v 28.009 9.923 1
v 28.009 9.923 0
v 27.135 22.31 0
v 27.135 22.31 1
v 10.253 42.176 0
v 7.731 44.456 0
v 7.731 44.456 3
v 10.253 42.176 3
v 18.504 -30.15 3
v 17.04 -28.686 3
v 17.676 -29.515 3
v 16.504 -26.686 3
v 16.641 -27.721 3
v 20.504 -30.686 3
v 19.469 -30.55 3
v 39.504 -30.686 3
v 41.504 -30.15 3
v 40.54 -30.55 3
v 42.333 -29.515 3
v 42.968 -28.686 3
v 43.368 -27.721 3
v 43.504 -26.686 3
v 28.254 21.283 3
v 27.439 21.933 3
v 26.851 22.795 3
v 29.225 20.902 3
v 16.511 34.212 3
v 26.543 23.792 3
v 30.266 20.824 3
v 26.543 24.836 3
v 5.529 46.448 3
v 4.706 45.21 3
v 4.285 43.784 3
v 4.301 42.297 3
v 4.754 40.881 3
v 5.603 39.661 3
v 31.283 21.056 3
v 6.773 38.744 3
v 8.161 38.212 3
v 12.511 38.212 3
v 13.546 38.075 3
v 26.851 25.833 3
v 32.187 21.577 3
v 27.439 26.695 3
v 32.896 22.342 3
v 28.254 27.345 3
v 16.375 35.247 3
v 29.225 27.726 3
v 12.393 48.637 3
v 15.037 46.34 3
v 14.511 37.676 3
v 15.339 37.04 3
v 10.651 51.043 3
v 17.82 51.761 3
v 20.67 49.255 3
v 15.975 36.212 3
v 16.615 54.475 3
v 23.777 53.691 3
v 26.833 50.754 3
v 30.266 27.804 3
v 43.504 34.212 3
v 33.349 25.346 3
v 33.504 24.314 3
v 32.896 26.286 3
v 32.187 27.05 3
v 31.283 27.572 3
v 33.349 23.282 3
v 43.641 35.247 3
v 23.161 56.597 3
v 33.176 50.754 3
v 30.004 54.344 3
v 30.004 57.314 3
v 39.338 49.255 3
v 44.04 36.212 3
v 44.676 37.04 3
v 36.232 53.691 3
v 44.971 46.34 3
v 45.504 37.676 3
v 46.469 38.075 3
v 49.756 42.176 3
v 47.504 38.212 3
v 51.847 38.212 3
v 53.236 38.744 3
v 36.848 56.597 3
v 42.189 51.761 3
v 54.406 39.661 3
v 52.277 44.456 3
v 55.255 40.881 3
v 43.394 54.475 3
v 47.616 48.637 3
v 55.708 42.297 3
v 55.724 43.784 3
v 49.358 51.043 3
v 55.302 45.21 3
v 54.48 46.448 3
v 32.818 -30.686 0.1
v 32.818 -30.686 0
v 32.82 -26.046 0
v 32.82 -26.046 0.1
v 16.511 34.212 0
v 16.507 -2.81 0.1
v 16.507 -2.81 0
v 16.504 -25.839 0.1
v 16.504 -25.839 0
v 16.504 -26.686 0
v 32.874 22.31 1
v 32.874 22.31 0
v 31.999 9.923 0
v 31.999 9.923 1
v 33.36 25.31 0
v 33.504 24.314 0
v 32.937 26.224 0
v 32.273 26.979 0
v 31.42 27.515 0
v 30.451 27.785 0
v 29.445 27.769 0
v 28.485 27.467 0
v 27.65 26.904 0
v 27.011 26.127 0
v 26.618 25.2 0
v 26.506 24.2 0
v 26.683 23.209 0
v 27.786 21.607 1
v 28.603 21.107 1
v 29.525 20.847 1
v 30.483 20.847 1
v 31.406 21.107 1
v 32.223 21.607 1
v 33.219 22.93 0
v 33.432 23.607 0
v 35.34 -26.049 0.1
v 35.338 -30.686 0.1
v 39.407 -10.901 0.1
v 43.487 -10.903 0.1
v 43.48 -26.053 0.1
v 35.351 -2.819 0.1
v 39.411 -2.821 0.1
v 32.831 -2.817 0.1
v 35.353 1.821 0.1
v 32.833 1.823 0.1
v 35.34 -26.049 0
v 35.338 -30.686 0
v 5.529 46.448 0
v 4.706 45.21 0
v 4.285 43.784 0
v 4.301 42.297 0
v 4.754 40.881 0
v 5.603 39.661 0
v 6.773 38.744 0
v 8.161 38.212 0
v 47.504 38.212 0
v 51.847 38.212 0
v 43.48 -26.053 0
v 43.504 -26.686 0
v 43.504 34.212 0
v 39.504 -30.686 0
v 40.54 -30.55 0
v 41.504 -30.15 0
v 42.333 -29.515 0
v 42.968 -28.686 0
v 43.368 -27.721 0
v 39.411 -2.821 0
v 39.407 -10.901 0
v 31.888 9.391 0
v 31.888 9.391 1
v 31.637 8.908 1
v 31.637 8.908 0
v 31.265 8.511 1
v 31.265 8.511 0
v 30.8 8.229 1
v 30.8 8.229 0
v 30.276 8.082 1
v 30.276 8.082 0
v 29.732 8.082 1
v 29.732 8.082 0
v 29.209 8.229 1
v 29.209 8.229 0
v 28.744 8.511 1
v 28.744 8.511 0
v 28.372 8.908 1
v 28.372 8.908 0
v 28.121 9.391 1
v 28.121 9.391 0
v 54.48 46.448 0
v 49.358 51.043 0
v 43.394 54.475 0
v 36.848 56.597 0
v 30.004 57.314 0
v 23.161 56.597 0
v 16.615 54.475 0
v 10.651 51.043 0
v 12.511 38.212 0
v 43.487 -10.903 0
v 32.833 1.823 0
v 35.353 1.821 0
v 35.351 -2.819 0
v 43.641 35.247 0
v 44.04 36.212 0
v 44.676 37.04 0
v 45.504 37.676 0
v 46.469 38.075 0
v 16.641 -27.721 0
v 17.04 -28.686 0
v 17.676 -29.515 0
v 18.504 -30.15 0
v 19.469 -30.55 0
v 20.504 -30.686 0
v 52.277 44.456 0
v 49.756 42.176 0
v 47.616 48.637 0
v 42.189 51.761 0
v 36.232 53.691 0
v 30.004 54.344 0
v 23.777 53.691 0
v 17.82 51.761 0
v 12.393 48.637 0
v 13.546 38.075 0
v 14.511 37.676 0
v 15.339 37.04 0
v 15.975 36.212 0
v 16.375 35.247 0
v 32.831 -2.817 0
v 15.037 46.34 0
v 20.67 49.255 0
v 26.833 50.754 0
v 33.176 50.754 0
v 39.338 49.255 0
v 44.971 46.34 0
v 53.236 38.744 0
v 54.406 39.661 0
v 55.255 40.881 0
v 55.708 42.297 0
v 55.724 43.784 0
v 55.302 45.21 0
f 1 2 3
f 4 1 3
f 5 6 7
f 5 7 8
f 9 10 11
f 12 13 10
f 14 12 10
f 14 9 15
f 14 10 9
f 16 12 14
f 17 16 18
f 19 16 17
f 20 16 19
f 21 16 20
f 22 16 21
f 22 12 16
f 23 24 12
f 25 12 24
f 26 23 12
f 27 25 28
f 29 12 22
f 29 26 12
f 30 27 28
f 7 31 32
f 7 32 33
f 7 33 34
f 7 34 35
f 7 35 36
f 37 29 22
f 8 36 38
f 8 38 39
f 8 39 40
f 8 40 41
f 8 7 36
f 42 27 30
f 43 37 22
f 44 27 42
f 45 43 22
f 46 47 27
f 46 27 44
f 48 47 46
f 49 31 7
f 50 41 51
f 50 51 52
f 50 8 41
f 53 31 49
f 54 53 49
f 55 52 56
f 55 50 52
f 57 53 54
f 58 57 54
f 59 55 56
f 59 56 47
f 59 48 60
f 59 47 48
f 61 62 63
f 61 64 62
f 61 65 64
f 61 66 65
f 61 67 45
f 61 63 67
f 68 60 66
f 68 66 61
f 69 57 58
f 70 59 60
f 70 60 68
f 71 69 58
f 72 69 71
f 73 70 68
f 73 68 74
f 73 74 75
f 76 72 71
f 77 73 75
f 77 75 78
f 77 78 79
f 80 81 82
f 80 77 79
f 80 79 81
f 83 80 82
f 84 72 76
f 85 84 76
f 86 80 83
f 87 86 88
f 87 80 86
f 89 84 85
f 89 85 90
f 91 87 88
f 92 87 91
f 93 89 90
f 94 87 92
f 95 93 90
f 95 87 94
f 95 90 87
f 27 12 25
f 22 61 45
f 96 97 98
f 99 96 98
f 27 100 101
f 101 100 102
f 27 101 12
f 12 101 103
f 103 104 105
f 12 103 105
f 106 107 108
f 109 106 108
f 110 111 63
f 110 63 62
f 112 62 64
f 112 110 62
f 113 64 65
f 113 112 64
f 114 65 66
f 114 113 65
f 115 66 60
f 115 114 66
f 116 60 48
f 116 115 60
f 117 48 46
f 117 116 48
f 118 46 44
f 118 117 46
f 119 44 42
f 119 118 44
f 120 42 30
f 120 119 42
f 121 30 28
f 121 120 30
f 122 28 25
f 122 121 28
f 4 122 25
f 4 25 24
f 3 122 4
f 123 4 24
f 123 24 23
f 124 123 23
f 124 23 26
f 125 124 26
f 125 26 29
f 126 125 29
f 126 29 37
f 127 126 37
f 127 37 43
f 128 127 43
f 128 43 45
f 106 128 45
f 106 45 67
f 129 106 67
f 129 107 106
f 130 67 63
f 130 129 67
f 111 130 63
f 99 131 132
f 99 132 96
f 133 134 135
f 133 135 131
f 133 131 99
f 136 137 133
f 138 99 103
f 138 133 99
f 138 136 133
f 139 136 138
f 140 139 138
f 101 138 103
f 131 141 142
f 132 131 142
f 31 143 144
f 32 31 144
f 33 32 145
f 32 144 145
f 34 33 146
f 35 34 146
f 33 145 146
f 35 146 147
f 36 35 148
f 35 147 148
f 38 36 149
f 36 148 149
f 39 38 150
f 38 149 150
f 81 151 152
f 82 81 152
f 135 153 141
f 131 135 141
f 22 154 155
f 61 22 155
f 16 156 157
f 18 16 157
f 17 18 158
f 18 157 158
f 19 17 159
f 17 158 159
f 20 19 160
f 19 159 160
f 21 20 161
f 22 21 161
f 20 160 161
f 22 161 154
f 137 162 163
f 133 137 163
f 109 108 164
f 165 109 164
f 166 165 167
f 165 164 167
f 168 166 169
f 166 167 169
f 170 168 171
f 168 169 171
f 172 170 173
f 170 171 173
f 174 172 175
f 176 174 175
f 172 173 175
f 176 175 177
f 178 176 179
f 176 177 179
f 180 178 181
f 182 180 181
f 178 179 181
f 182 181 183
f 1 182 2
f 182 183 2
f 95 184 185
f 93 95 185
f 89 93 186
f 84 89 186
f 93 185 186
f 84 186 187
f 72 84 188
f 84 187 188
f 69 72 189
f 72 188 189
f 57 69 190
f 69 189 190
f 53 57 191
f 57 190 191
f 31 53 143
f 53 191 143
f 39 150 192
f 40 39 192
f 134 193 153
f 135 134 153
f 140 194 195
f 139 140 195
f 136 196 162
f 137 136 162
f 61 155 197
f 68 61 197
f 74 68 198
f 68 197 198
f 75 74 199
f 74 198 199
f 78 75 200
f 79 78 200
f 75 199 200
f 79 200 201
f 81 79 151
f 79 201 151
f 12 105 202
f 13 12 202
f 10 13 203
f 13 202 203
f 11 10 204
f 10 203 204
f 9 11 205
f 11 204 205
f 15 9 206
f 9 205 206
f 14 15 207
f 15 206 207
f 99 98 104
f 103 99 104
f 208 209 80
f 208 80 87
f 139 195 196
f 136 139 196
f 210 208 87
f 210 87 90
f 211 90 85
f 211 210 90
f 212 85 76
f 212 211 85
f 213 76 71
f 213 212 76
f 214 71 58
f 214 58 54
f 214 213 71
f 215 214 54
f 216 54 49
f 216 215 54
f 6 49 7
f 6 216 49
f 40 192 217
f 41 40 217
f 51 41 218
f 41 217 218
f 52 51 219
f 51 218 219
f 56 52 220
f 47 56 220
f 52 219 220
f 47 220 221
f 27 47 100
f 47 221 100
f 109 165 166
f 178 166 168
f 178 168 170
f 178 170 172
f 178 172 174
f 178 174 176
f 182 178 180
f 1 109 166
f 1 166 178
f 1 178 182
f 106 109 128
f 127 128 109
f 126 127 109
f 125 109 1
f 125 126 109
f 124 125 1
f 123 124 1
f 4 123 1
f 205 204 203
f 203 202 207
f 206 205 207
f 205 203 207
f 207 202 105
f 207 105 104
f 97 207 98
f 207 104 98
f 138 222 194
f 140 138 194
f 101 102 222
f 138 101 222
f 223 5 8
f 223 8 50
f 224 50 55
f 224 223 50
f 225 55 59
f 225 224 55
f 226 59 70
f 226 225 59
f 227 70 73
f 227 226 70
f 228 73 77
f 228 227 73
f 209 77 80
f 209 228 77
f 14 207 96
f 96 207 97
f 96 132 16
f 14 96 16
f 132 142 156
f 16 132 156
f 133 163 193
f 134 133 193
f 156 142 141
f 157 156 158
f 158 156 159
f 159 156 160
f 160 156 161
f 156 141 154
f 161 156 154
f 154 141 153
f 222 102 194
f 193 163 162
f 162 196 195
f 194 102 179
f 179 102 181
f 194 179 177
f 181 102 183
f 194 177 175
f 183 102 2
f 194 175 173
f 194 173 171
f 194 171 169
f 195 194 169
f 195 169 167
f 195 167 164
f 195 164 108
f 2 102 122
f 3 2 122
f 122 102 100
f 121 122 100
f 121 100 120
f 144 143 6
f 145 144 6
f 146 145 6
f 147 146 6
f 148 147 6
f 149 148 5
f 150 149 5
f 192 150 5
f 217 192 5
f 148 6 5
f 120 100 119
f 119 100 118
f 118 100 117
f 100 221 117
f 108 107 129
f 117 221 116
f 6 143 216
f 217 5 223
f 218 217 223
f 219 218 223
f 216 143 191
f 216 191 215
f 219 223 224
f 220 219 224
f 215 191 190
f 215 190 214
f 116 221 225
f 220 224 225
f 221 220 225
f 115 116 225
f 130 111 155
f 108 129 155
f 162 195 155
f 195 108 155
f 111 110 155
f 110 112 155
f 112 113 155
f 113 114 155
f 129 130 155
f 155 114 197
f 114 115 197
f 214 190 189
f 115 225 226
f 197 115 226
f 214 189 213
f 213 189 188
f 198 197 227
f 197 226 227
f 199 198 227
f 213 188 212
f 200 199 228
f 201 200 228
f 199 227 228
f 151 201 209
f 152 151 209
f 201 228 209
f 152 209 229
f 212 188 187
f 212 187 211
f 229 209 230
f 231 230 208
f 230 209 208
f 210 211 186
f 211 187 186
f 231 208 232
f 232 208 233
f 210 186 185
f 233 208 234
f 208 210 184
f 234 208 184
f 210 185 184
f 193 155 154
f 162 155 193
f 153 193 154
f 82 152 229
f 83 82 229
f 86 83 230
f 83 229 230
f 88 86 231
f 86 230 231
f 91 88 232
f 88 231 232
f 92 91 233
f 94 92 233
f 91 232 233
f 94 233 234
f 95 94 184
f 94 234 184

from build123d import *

# Parameters (mm, degrees)
CORTE_EXTERIOR_R        = 3.500002593
SALIENTE_EXTRUIR1_DEPTH = 3
CORTAR_EXTRUIR1_DEPTH   = 1
CORTAR_EXTRUIR2_DEPTH   = 0.1


with BuildPart() as part:
    # Corte exterior → Saliente-Extruir1 (new body)
    with BuildSketch(Plane.XY):
        with BuildLine():
            Line((47.504320945, 38.211786495), (51.847305041, 38.211786495))
            ThreePointArc((51.847305041, 38.211786495), (55.534254627, 41.572373104), (54.480090972, 46.448424641))
            ThreePointArc((54.480090972, 46.448424641), (30.004320476, 57.31391234), (5.528550918, 46.448424641))
            ThreePointArc((5.528550918, 46.448424641), (4.474387263, 41.572373104), (8.161336848, 38.211786495))
            Line((8.161336848, 38.211786495), (12.511035037, 38.211786495))
            ThreePointArc((12.511035037, 38.211786495), (15.339462162, 37.04021362), (16.511035037, 34.211786495))
            Line((16.511035037, 34.211786495), (16.504320945, -26.686088981))
            ThreePointArc((16.504320945, -26.686088981), (17.67589382, -29.514516106), (20.504320945, -30.686088981))
            Line((20.504320945, -30.686088981), (39.504320945, -30.686088981))
            ThreePointArc((39.504320945, -30.686088981), (42.33274807, -29.514516106), (43.504320945, -26.686088981))
            Line((43.504320945, -26.686088981), (43.504320945, 34.211786495))
            ThreePointArc((43.504320945, 34.211786495), (44.67589382, 37.04021362), (47.504320945, 38.211786495))
        make_face()
        with Locations((30.00431952, 24.313911283)):
            Circle(CORTE_EXTERIOR_R, mode=Mode.SUBTRACT)
        with BuildLine():
            ThreePointArc((52.277272453, 44.456319148), (30.004320476, 54.343913397), (7.731367869, 44.456320565))
            Line((7.731367869, 44.456320565), (10.253113799, 42.175794866))
            ThreePointArc((10.253113799, 42.175794866), (30.004320476, 50.943913397), (49.755526523, 42.175793449))
            Line((49.755526523, 42.175793449), (52.277272453, 44.456319148))
        make_face(mode=Mode.SUBTRACT)
    extrude(amount=SALIENTE_EXTRUIR1_DEPTH)

    # Grabado Superficie → Cortar-Extruir1 (cut)
    with BuildSketch(Plane.XY):
        with BuildLine():
            Line((32.873672963, 22.309708905), (31.999357171, 9.92309063))
            ThreePointArc((31.999357171, 9.92309063), (30.004320945, 8.063911283), (28.009284719, 9.92309063))
            Line((28.009284719, 9.92309063), (27.134968927, 22.309708905))
            ThreePointArc((27.134968927, 22.309708905), (30.004320945, 20.813910115), (32.873672963, 22.309708905))
        make_face()
    extrude(amount=CORTAR_EXTRUIR1_DEPTH, mode=Mode.SUBTRACT)

    # grabado linea medio → Cortar-Extruir2 (cut)
    with BuildSketch(Plane.XY):
        Polygon((43.479990352, -26.052604982), (35.339991301, -26.048672531), (35.337749708, -30.68867199), (32.817750002, -30.687454573), (32.819992183, -26.046238615), (16.48009071, -25.838344751), (16.491215962, -2.809563938), (32.831214056, -2.817457825), (32.833455649, 1.822541634), (35.353455355, 1.821324216), (35.351213761, -2.818675242), (39.411213288, -2.820636636), (39.407309823, -10.900635693), (43.487309347, -10.90260675), align=None)
    extrude(amount=CORTAR_EXTRUIR2_DEPTH, mode=Mode.SUBTRACT)


solid = part.part
